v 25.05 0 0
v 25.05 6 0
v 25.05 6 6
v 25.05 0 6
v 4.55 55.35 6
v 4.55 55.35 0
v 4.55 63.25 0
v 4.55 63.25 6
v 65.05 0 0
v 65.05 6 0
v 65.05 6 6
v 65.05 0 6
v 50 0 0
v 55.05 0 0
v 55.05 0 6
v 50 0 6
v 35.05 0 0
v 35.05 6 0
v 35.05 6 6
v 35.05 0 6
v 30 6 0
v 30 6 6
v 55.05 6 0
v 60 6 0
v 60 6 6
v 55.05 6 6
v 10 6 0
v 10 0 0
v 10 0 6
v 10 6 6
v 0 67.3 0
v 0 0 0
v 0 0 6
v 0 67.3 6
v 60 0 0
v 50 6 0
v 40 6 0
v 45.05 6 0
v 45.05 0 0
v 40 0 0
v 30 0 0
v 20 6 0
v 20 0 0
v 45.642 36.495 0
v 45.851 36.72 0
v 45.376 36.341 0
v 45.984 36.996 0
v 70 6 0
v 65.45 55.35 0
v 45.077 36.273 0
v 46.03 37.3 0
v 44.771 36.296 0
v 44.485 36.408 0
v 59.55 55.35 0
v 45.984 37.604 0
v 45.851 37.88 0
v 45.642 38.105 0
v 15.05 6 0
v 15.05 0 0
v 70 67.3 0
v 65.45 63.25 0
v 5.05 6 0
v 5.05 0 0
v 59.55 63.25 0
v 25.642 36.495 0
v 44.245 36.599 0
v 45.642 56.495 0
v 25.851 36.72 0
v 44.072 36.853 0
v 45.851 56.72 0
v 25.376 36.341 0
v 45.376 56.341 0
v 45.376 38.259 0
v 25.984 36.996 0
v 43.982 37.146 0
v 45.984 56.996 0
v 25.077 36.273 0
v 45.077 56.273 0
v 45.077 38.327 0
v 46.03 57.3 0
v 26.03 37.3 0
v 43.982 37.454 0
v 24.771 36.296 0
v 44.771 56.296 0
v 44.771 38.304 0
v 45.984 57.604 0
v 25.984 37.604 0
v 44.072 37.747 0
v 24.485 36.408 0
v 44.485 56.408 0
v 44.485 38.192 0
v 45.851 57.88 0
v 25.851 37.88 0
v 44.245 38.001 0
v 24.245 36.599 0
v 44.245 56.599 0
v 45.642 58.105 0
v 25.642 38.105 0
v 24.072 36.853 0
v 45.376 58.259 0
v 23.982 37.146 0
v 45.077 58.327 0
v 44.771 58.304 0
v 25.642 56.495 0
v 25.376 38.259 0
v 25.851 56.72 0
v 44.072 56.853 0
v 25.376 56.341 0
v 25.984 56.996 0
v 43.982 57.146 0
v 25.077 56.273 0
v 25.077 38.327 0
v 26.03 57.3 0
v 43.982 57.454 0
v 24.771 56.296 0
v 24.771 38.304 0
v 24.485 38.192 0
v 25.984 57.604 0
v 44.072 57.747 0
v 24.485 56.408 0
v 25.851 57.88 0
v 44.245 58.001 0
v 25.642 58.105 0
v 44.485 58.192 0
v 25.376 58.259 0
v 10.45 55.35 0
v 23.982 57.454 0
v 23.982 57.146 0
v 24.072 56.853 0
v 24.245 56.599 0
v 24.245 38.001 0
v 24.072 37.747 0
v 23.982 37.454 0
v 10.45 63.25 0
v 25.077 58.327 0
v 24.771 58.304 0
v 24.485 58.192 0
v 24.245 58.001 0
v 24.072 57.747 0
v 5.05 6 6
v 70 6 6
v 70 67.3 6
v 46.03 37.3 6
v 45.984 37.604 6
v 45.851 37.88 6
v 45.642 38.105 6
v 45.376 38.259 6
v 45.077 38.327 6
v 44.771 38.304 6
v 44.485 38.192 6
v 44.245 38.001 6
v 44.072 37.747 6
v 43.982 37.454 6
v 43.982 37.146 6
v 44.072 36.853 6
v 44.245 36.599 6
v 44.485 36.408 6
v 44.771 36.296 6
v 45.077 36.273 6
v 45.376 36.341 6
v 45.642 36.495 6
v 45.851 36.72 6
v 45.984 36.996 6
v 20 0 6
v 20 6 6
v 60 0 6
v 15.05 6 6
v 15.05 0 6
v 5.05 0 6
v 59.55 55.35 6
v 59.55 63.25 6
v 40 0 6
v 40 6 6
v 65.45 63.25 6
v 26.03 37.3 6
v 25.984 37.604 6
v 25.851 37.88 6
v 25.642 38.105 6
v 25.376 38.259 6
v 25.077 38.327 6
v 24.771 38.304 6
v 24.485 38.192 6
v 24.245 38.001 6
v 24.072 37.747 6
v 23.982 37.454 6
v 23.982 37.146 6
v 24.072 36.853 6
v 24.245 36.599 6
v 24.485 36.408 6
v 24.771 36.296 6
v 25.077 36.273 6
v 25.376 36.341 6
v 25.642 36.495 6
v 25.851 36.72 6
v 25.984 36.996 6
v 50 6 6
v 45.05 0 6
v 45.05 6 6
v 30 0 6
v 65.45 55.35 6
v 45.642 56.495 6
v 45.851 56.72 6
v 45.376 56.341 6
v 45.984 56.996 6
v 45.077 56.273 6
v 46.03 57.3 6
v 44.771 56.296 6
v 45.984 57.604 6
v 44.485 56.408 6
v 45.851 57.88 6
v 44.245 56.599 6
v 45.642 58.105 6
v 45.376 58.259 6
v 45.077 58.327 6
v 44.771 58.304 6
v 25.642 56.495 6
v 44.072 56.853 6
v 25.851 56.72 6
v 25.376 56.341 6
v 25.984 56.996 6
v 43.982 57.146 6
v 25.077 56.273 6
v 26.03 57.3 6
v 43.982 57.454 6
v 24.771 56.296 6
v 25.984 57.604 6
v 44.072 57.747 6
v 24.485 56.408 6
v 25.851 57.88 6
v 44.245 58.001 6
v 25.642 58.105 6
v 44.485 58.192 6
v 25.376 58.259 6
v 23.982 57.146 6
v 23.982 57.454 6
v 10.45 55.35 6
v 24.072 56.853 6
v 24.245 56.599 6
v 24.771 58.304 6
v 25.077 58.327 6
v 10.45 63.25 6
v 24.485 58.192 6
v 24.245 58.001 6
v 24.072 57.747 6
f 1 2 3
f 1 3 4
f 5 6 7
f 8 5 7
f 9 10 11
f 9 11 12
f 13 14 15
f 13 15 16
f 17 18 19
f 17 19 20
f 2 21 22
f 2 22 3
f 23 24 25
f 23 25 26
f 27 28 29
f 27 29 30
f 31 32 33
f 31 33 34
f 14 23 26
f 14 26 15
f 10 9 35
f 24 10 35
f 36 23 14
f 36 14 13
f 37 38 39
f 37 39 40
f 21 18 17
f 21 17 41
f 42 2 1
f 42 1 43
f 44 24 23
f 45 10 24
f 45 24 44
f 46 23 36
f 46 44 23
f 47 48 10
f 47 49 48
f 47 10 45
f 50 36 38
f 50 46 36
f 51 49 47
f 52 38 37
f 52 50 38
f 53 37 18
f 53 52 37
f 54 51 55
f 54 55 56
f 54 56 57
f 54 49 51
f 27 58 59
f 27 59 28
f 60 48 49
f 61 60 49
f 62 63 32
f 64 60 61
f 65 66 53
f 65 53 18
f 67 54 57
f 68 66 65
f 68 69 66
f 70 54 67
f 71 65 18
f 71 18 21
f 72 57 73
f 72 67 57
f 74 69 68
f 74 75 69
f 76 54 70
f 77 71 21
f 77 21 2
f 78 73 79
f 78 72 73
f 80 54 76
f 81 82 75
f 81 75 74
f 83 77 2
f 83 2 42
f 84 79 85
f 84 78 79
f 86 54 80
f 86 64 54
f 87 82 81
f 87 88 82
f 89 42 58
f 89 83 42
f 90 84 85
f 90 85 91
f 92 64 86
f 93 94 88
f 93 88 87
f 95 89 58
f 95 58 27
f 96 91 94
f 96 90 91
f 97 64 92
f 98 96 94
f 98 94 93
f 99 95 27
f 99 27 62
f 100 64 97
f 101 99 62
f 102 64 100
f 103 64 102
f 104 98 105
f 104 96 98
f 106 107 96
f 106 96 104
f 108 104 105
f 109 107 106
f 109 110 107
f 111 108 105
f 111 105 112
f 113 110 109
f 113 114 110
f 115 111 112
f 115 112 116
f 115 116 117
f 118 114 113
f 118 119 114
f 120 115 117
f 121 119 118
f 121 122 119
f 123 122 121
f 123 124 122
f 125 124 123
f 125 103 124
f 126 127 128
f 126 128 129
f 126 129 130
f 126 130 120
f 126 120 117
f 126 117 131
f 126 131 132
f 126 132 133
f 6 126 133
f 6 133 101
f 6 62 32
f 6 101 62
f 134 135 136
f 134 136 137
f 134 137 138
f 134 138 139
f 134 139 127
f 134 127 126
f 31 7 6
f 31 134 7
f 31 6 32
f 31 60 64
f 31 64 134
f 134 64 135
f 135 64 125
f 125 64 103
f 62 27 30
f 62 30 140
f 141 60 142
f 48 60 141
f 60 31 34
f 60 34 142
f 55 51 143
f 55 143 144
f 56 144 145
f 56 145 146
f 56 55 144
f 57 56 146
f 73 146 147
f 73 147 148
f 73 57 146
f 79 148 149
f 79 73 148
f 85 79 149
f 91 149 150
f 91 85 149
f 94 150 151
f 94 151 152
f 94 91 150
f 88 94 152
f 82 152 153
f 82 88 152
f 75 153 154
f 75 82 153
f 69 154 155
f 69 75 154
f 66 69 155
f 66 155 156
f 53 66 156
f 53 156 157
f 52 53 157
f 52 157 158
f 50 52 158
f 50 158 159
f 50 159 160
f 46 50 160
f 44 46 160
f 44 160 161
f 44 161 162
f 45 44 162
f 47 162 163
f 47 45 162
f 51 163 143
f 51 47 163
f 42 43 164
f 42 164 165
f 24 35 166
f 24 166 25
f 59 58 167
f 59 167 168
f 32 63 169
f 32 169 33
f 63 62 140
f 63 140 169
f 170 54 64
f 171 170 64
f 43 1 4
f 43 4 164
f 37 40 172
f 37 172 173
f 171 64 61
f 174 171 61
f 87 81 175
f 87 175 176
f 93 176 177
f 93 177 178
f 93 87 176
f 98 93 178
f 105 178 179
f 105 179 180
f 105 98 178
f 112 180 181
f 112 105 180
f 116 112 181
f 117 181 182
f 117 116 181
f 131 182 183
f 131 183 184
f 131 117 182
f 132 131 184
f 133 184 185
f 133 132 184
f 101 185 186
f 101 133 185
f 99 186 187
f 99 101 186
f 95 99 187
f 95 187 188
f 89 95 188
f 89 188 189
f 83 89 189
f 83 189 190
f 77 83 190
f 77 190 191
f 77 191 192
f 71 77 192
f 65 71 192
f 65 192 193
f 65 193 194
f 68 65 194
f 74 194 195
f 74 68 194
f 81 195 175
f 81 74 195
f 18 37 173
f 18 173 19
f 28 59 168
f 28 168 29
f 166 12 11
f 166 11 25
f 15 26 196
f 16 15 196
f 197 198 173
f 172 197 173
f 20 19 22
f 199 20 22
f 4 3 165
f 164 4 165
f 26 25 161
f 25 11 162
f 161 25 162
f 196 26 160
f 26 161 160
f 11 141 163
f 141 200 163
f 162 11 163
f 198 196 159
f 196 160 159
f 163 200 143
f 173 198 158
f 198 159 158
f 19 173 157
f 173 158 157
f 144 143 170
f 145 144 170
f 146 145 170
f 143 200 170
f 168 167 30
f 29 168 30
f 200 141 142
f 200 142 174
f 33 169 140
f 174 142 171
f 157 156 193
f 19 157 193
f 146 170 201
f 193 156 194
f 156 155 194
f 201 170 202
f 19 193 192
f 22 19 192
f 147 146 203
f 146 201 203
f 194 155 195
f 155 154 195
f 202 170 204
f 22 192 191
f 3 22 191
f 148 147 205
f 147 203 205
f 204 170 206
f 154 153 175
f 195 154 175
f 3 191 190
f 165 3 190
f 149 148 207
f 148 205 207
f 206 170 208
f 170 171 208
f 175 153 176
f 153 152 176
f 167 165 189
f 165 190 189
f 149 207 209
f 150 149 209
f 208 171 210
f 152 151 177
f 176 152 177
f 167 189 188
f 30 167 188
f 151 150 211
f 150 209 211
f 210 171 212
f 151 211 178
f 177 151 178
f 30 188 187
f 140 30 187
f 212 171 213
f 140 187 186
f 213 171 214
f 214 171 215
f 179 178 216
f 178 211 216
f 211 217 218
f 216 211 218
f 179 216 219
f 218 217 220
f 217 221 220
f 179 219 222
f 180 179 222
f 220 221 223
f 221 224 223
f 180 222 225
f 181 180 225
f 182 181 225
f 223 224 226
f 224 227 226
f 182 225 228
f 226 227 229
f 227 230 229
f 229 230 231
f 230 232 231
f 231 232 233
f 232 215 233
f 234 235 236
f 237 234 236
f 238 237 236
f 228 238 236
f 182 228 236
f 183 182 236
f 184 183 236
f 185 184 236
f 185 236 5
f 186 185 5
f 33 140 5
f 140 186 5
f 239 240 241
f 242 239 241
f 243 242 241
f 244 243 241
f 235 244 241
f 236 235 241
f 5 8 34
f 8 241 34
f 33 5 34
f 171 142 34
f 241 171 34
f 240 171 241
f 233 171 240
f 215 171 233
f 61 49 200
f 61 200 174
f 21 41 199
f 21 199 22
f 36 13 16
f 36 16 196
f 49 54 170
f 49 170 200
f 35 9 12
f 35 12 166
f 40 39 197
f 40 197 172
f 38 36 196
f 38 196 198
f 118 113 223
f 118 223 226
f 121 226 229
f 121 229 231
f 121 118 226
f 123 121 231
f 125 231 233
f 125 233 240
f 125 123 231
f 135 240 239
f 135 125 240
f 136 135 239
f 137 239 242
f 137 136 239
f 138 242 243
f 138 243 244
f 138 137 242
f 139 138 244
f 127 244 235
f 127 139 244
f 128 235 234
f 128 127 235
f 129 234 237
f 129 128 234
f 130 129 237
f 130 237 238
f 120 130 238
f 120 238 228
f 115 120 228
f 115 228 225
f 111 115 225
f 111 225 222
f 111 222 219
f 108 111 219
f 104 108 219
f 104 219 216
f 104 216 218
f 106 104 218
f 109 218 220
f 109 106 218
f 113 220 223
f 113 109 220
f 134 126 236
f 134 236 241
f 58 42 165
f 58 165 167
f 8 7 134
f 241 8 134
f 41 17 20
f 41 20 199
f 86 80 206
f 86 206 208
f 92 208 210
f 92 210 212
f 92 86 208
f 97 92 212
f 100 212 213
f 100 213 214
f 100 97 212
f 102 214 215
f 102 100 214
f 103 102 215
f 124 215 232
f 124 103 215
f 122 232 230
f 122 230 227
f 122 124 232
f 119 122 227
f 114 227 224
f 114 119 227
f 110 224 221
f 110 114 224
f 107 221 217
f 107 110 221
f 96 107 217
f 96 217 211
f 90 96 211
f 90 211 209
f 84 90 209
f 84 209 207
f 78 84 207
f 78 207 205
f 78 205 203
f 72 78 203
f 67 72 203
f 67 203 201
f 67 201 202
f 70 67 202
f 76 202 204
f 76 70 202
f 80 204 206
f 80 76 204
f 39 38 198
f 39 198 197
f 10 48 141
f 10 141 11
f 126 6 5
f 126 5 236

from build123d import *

# Parameters (mm, degrees)
ESQUISSE1_R        = 1.03
ESQUISSE1_W        = 5.9
ESQUISSE1_H        = 7.9
BOSS_EXTRU_1_DEPTH = 6


with BuildPart() as part:
    # Esquisse1 → Boss.-Extru.1 (new body)
    with BuildSketch(Plane.XY):
        Polygon((0, 0), (0, 67.3), (70, 67.3), (70, 6), (65.05, 6), (65.05, 0), (60, 0), (60, 6), (55.05, 6), (55.05, 0), (50, 0), (50, 6), (45.05, 6), (45.05, 0), (40, 0), (40, 6), (35.05, 6), (35.05, 0), (30, 0), (30, 6), (25.05, 6), (25.05, 0), (20, 0), (20, 6), (15.05, 6), (15.05, 0), (10, 0), (10, 6), (5.05, 6), (5.05, 0), align=None)
        with Locations((25, 57.3)):
            Circle(ESQUISSE1_R, mode=Mode.SUBTRACT)
        with Locations((45, 57.3)):
            Circle(ESQUISSE1_R, mode=Mode.SUBTRACT)
        with Locations((25, 37.3)):
            Circle(ESQUISSE1_R, mode=Mode.SUBTRACT)
        with Locations((45, 37.3)):
            Circle(ESQUISSE1_R, mode=Mode.SUBTRACT)
        with Locations((7.5, 59.3)):
            Rectangle(ESQUISSE1_W, ESQUISSE1_H, mode=Mode.SUBTRACT)
        with Locations((62.5, 59.3)):
            Rectangle(ESQUISSE1_W, ESQUISSE1_H, mode=Mode.SUBTRACT)
    extrude(amount=BOSS_EXTRU_1_DEPTH)


solid = part.part
